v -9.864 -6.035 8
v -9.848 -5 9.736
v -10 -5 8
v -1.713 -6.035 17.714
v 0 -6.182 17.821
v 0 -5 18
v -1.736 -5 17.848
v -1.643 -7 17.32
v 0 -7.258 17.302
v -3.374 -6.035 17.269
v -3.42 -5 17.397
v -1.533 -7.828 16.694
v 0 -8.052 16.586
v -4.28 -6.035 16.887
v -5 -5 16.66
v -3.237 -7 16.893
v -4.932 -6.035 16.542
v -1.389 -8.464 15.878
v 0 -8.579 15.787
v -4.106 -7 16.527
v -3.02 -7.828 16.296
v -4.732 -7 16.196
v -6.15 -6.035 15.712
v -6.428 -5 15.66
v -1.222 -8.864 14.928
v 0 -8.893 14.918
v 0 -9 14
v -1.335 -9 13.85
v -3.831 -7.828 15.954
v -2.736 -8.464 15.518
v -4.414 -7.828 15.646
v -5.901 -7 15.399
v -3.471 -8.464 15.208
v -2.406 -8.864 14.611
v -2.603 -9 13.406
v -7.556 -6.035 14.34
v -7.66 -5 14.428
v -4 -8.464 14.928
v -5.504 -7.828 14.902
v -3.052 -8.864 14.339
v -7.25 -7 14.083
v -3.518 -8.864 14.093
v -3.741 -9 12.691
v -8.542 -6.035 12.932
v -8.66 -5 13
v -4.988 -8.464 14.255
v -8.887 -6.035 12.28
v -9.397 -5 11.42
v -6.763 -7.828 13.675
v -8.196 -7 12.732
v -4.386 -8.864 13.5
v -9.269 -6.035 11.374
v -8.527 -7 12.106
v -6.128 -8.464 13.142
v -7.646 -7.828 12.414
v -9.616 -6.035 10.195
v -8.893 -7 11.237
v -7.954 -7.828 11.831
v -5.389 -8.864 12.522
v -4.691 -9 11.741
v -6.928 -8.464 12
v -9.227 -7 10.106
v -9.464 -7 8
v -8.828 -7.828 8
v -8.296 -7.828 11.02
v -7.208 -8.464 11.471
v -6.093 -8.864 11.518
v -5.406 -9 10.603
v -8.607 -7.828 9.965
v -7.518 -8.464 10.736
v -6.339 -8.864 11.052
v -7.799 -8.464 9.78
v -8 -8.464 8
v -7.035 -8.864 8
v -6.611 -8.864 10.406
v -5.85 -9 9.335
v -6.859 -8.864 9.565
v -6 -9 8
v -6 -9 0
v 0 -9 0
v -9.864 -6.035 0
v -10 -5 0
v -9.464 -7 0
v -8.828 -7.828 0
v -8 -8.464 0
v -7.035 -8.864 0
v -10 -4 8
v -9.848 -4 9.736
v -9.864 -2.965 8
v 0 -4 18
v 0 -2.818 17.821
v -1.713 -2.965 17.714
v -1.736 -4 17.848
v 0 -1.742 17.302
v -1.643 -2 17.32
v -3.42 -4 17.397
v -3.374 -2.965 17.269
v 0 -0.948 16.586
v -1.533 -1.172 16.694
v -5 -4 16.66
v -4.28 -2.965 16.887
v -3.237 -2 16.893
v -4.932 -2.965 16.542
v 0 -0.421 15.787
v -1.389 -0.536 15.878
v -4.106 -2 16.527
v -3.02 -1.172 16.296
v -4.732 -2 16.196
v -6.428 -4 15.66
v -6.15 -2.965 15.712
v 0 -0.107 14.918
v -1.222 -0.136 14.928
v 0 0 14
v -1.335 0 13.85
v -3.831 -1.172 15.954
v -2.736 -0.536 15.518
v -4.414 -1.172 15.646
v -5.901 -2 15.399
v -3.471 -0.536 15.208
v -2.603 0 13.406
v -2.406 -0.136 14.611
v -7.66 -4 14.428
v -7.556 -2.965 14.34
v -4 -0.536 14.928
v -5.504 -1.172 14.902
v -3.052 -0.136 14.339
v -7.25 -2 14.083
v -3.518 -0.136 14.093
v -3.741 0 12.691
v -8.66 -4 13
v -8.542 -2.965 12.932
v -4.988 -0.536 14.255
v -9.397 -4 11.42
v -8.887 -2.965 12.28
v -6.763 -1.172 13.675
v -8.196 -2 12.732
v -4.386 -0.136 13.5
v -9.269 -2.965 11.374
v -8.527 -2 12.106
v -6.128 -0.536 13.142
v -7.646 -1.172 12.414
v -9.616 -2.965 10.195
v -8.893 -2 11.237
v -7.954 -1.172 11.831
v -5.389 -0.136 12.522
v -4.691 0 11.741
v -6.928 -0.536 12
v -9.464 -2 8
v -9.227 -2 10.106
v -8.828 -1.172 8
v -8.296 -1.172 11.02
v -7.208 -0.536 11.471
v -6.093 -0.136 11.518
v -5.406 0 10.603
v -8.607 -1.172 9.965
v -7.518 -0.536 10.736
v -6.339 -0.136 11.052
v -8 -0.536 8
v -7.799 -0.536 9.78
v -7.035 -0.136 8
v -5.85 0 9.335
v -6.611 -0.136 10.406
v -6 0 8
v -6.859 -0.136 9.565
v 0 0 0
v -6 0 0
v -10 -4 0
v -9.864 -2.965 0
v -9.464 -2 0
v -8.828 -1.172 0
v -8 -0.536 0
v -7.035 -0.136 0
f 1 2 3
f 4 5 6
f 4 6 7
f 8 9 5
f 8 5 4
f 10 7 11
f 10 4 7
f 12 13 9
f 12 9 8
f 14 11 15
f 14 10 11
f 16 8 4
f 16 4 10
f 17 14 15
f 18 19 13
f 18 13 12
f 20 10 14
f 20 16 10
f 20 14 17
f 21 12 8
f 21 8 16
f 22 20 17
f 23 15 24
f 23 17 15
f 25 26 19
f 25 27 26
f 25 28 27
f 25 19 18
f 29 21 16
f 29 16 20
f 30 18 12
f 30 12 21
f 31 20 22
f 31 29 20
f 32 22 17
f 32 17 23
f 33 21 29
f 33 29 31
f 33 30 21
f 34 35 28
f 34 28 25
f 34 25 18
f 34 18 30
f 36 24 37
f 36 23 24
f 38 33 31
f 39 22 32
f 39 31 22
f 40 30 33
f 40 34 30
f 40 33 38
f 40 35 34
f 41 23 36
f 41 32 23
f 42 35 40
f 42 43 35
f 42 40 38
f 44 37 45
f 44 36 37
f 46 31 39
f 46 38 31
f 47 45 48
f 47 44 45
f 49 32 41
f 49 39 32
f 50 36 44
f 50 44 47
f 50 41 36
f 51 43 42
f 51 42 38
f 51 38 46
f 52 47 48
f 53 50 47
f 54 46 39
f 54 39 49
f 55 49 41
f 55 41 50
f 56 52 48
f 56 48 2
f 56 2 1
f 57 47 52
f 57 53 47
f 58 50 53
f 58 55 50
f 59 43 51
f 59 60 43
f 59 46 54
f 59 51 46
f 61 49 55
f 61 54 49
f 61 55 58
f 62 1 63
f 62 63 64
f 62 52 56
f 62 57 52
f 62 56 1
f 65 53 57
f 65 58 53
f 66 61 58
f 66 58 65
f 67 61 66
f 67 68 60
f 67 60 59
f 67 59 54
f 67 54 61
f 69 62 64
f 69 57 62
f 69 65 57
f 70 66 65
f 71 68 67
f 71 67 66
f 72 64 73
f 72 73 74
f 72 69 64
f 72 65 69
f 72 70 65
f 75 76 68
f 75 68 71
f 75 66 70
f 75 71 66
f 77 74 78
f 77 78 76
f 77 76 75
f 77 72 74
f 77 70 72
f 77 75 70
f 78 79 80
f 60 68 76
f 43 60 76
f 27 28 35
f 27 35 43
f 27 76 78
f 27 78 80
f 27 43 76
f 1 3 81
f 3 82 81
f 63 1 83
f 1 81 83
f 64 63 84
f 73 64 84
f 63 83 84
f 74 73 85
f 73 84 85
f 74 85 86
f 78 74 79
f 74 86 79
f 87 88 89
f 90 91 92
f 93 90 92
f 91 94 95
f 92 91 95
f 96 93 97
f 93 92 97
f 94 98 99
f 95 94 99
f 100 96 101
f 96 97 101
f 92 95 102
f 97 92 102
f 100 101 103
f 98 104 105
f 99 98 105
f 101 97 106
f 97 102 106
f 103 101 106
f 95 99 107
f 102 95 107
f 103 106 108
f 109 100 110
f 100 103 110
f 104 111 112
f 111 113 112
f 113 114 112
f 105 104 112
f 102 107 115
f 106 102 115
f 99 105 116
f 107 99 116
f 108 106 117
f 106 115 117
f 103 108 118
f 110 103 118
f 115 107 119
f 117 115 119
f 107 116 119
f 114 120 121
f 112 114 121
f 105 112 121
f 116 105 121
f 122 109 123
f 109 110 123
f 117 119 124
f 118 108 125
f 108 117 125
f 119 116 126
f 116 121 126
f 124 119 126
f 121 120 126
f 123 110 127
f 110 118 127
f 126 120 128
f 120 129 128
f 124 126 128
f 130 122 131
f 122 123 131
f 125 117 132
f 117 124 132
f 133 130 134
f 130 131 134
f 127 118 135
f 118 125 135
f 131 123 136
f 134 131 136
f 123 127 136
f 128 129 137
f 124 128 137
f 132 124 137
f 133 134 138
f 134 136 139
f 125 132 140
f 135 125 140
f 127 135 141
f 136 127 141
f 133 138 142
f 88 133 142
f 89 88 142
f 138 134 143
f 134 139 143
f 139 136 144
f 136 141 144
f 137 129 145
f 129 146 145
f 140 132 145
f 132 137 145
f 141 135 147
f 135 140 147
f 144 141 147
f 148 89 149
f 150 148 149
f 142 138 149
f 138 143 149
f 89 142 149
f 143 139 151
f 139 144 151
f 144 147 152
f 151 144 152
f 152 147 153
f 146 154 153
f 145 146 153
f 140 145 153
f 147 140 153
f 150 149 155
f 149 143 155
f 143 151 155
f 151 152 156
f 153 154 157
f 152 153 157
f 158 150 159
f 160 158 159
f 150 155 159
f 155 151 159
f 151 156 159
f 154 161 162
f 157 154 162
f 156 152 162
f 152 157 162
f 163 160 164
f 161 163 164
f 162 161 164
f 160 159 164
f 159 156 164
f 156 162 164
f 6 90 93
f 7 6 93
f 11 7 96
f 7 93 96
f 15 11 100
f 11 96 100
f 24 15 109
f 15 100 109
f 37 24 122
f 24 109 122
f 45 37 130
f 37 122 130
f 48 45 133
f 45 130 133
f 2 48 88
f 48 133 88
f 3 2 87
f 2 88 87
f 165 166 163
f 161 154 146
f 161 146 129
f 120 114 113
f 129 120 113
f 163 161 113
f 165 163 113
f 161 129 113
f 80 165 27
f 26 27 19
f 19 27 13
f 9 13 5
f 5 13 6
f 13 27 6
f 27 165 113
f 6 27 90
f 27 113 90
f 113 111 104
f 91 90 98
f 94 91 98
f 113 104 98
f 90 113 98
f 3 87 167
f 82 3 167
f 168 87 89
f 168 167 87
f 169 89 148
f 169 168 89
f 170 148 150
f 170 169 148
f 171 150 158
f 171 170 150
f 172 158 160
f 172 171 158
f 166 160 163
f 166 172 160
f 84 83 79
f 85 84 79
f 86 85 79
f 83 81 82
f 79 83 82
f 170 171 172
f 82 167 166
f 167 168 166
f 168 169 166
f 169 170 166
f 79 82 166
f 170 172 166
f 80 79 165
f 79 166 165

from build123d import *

# Parameters (mm, degrees)
F1_DEPTH = 9
F2_R     = 4


with BuildPart() as f1:
    # F0 (on Front) → F1 (new body)
    with BuildSketch(Plane.XZ):
        with BuildLine():
            Line((-10, 8), (-10, 0))
            Line((-10, 0), (0, 0))
            Line((0, 0), (0, 18))
            ThreePointArc((0, 18), (-7.071068, 15.071068), (-10, 8))
        make_face()
    extrude(amount=F1_DEPTH)

    # F2
    f2_edges = [f1.edges().sort_by_distance(p)[0] for p in [
        (-7.071068, 0, 15.071068),
        (-10, 0, 4),
        (-10, -9, 4),
        (-7.071068, -9, 15.071068),
    ]]
    fillet(f2_edges, radius=F2_R)


solid = f1.part
